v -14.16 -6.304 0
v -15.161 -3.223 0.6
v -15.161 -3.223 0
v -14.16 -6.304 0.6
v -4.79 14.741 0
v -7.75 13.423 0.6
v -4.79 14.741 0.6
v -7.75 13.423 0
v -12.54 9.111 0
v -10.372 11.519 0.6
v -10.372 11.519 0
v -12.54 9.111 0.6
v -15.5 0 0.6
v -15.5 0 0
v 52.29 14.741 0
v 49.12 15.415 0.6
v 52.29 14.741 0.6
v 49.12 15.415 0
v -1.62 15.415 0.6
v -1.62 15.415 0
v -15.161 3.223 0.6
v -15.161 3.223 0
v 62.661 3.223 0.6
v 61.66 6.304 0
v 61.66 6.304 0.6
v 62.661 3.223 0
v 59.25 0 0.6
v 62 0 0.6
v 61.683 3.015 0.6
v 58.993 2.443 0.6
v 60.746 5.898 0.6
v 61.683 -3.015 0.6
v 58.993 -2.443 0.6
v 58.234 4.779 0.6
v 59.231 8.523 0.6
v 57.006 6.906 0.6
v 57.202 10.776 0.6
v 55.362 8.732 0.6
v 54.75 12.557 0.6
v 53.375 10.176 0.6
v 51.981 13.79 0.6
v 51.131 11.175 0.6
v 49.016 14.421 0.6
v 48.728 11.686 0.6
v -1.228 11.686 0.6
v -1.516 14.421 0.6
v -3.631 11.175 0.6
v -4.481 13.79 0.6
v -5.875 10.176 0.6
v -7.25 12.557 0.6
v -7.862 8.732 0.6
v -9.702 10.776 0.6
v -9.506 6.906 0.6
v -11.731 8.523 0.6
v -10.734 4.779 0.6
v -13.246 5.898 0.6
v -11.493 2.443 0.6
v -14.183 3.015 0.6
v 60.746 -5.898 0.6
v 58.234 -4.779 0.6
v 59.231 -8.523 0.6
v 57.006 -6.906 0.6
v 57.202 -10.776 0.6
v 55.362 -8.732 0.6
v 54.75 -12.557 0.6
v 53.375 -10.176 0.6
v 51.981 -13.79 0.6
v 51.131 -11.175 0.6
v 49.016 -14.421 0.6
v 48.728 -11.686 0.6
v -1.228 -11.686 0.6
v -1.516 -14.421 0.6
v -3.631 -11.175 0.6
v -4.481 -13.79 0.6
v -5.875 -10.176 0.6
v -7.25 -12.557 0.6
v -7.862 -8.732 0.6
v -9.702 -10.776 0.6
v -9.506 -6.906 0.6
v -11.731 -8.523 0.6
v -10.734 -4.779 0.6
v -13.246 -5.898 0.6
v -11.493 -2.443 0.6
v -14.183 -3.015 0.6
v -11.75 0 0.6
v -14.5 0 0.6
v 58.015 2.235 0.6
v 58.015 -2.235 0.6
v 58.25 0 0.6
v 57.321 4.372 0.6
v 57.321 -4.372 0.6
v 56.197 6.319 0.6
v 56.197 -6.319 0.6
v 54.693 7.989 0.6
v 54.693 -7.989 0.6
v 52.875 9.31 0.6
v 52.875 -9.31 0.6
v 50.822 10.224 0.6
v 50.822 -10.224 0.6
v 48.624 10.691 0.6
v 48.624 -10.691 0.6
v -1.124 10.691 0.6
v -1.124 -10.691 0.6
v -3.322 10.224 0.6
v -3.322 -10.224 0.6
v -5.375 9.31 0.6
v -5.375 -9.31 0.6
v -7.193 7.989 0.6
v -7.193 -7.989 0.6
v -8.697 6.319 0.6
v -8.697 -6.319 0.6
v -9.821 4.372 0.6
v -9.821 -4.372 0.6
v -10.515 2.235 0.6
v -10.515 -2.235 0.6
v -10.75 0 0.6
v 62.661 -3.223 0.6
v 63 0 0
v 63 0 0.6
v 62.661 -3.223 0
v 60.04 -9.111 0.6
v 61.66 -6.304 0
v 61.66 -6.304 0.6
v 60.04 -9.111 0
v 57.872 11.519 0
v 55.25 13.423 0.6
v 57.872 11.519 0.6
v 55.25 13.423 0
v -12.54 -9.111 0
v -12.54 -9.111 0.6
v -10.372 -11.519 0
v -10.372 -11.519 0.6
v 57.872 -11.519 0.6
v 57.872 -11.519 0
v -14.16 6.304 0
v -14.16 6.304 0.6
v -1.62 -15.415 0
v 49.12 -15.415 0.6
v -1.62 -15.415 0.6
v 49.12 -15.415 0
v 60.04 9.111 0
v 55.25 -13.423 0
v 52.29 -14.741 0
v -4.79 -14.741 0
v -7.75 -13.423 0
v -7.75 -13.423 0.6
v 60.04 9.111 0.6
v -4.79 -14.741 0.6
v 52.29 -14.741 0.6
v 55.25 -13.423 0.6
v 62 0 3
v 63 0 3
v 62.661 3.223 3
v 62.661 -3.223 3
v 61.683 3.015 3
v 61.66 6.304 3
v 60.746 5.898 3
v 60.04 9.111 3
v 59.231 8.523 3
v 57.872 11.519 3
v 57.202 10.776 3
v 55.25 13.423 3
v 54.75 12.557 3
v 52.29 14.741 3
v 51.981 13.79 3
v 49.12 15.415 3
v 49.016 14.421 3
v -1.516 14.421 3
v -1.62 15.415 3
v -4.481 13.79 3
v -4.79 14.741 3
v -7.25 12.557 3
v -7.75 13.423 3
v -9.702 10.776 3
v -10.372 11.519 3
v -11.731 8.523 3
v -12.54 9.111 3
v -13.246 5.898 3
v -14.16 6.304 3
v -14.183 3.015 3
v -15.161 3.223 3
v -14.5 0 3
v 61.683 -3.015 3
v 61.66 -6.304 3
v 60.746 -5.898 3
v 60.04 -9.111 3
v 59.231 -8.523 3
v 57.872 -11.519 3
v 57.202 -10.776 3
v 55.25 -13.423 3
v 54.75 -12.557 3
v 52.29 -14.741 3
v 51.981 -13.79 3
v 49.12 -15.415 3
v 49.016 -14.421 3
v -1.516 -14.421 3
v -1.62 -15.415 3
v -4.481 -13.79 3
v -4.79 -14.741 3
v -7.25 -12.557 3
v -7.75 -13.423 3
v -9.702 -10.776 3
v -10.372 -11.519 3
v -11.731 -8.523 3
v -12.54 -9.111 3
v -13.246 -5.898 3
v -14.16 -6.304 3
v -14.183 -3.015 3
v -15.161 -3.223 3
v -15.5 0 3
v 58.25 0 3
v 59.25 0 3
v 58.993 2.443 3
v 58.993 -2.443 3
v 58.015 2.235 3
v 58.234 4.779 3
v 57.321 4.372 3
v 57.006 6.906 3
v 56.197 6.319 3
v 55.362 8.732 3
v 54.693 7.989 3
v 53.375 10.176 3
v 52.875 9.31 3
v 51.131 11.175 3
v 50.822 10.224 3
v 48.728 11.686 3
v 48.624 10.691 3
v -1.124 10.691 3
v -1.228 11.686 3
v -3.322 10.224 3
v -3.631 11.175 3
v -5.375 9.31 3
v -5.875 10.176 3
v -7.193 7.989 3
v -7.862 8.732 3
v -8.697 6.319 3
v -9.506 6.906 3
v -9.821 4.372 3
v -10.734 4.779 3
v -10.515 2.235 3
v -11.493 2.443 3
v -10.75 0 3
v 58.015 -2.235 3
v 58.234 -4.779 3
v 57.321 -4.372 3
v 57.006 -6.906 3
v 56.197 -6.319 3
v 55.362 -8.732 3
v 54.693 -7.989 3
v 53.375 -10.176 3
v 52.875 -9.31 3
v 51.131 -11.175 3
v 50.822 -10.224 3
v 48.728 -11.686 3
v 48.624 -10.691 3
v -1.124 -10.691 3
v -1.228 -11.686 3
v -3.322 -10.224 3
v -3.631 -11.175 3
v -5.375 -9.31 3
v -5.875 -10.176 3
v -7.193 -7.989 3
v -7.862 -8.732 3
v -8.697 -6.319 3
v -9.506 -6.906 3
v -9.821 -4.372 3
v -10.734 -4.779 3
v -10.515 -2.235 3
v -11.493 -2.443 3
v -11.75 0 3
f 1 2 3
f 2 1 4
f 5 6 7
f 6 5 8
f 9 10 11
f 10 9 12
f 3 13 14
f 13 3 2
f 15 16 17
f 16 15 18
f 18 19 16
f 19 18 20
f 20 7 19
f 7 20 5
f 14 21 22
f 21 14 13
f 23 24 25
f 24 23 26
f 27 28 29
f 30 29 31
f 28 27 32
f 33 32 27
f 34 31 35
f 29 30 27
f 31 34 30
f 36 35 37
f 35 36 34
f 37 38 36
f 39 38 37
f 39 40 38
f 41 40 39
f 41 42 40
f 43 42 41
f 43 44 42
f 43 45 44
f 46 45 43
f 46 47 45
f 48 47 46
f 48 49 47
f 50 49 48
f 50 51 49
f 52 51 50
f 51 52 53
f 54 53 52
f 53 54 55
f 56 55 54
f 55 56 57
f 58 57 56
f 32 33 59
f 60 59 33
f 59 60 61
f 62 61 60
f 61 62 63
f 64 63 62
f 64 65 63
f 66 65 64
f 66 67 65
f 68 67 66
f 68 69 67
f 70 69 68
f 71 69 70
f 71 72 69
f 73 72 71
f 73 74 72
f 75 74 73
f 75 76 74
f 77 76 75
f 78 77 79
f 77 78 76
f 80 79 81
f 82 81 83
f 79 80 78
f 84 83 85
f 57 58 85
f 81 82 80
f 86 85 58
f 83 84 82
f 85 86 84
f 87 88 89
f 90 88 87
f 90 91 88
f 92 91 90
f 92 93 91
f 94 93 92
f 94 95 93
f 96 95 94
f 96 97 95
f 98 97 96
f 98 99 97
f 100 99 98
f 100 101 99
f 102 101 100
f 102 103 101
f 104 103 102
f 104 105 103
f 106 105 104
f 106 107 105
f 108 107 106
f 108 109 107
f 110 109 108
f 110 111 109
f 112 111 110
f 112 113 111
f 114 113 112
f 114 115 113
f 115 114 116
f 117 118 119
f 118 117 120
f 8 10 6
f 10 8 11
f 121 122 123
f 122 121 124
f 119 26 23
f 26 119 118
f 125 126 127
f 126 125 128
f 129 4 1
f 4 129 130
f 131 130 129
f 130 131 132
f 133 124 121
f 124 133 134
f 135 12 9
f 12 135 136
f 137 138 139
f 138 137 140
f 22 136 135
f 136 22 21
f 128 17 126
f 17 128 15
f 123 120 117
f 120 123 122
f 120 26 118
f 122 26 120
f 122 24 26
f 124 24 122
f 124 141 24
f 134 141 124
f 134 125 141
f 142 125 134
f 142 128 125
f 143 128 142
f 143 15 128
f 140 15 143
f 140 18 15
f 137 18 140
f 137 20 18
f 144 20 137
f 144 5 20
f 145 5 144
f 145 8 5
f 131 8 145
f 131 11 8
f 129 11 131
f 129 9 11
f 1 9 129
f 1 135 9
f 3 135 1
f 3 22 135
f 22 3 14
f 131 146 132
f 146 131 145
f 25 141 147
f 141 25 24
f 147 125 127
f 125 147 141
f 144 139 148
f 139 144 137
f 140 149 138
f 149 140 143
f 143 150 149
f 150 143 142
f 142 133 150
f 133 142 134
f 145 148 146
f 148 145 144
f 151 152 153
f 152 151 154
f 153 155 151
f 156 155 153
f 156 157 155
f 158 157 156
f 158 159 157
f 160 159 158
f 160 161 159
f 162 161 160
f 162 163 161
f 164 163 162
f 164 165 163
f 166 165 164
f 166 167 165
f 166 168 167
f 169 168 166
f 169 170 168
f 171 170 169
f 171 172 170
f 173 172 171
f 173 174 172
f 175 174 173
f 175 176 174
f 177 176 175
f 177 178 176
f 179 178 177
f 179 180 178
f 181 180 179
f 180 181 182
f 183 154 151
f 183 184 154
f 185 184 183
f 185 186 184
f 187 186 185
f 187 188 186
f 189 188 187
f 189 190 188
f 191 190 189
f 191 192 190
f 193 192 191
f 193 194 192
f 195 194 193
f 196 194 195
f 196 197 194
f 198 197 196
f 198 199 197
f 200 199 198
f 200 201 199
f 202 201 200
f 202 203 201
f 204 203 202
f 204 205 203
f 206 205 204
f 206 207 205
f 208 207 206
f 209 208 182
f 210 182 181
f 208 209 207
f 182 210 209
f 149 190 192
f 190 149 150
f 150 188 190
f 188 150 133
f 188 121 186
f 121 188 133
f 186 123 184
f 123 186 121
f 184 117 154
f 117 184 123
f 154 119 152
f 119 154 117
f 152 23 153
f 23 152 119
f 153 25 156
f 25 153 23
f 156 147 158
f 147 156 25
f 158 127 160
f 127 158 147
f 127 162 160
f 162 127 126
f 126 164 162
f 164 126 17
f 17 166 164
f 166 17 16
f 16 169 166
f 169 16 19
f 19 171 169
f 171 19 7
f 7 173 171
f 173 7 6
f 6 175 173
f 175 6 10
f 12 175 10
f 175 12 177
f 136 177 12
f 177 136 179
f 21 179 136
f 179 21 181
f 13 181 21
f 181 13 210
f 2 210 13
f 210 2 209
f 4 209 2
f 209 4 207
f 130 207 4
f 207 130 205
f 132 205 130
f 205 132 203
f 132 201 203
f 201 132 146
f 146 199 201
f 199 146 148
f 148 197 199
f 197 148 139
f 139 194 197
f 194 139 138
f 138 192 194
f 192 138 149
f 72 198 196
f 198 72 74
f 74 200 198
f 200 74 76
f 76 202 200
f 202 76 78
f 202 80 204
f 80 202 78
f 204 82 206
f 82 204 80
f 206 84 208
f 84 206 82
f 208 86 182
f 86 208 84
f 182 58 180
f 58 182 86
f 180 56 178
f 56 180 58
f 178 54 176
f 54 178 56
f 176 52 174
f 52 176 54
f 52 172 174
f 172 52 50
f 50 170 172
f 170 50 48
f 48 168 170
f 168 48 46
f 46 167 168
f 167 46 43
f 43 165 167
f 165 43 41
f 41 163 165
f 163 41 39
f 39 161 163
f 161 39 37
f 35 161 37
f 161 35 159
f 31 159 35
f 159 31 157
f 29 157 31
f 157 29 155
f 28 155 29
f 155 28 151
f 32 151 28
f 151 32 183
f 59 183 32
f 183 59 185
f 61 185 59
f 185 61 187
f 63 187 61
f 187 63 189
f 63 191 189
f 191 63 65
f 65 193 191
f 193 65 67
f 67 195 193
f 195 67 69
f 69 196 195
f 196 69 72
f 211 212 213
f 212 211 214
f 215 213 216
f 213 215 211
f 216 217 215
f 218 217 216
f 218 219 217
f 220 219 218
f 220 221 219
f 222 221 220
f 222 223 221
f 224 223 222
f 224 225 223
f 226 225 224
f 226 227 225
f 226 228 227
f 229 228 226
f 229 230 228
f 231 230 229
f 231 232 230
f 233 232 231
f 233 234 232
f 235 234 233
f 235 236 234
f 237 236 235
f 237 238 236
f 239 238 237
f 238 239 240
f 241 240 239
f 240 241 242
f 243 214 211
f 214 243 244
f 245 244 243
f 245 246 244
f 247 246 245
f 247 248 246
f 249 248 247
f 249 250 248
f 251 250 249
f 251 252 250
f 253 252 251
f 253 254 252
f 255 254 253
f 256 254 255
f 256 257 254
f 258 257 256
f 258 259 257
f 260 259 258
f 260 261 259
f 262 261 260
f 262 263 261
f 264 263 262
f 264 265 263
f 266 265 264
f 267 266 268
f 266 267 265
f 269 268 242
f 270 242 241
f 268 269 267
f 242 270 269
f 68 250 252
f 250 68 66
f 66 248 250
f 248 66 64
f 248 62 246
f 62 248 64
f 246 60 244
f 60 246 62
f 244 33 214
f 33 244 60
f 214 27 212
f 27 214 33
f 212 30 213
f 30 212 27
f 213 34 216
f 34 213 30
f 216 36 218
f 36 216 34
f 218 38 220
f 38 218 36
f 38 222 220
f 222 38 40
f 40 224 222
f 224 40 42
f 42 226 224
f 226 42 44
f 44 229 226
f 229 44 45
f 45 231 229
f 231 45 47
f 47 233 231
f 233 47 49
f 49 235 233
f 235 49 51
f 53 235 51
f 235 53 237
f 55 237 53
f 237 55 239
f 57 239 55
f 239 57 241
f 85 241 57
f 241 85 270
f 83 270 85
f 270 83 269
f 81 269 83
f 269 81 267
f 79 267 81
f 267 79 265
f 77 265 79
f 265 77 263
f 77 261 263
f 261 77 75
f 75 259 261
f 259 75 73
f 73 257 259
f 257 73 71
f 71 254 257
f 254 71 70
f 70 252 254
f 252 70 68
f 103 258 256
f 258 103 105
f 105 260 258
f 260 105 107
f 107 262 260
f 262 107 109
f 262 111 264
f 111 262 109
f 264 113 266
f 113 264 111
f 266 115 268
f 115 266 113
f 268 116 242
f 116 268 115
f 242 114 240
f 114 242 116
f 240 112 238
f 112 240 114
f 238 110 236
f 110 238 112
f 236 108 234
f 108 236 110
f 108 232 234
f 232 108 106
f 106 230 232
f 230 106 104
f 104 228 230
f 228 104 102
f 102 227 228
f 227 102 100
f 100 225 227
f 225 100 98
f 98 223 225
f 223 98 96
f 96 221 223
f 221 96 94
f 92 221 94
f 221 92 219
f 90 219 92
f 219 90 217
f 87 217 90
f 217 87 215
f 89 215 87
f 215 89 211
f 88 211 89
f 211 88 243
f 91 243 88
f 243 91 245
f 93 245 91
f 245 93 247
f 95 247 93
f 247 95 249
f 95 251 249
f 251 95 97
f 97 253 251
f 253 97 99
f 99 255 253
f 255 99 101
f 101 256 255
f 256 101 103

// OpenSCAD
/*

My mum's backgammon set has a crappy cardboard box, and it is easy to lose the dice/pieces.
So ,why not print some plastic lids for the dice shakers, and then all of the pieces and the dice
can be stored in there, safe and sound.

The dice shakers are slightly concave, which helps the lids stay on, as the lid stretches the
dice shaker slightly.

Printed with PLA.

*/

module lid()
{
    thickness=0.6;
    lip = 2.4;
    side = 2;
    outer=29;
    inner=23.5;
    l=76.5;
    center_dist = l - outer;

    module oval( d ) {
        hull() {
            circle( d=d );
            translate( [center_dist,0] ) circle( d=d );
        }
    }

    linear_extrude(thickness) {
        oval( outer+side );
    }

    linear_extrude(thickness + lip) {
        difference() {
            oval( outer+side );
            oval( outer );
        }
    }

    linear_extrude(thickness + lip) {
        difference() {
            oval( inner );
            oval( inner-side );
        }
    }

}


lid();
